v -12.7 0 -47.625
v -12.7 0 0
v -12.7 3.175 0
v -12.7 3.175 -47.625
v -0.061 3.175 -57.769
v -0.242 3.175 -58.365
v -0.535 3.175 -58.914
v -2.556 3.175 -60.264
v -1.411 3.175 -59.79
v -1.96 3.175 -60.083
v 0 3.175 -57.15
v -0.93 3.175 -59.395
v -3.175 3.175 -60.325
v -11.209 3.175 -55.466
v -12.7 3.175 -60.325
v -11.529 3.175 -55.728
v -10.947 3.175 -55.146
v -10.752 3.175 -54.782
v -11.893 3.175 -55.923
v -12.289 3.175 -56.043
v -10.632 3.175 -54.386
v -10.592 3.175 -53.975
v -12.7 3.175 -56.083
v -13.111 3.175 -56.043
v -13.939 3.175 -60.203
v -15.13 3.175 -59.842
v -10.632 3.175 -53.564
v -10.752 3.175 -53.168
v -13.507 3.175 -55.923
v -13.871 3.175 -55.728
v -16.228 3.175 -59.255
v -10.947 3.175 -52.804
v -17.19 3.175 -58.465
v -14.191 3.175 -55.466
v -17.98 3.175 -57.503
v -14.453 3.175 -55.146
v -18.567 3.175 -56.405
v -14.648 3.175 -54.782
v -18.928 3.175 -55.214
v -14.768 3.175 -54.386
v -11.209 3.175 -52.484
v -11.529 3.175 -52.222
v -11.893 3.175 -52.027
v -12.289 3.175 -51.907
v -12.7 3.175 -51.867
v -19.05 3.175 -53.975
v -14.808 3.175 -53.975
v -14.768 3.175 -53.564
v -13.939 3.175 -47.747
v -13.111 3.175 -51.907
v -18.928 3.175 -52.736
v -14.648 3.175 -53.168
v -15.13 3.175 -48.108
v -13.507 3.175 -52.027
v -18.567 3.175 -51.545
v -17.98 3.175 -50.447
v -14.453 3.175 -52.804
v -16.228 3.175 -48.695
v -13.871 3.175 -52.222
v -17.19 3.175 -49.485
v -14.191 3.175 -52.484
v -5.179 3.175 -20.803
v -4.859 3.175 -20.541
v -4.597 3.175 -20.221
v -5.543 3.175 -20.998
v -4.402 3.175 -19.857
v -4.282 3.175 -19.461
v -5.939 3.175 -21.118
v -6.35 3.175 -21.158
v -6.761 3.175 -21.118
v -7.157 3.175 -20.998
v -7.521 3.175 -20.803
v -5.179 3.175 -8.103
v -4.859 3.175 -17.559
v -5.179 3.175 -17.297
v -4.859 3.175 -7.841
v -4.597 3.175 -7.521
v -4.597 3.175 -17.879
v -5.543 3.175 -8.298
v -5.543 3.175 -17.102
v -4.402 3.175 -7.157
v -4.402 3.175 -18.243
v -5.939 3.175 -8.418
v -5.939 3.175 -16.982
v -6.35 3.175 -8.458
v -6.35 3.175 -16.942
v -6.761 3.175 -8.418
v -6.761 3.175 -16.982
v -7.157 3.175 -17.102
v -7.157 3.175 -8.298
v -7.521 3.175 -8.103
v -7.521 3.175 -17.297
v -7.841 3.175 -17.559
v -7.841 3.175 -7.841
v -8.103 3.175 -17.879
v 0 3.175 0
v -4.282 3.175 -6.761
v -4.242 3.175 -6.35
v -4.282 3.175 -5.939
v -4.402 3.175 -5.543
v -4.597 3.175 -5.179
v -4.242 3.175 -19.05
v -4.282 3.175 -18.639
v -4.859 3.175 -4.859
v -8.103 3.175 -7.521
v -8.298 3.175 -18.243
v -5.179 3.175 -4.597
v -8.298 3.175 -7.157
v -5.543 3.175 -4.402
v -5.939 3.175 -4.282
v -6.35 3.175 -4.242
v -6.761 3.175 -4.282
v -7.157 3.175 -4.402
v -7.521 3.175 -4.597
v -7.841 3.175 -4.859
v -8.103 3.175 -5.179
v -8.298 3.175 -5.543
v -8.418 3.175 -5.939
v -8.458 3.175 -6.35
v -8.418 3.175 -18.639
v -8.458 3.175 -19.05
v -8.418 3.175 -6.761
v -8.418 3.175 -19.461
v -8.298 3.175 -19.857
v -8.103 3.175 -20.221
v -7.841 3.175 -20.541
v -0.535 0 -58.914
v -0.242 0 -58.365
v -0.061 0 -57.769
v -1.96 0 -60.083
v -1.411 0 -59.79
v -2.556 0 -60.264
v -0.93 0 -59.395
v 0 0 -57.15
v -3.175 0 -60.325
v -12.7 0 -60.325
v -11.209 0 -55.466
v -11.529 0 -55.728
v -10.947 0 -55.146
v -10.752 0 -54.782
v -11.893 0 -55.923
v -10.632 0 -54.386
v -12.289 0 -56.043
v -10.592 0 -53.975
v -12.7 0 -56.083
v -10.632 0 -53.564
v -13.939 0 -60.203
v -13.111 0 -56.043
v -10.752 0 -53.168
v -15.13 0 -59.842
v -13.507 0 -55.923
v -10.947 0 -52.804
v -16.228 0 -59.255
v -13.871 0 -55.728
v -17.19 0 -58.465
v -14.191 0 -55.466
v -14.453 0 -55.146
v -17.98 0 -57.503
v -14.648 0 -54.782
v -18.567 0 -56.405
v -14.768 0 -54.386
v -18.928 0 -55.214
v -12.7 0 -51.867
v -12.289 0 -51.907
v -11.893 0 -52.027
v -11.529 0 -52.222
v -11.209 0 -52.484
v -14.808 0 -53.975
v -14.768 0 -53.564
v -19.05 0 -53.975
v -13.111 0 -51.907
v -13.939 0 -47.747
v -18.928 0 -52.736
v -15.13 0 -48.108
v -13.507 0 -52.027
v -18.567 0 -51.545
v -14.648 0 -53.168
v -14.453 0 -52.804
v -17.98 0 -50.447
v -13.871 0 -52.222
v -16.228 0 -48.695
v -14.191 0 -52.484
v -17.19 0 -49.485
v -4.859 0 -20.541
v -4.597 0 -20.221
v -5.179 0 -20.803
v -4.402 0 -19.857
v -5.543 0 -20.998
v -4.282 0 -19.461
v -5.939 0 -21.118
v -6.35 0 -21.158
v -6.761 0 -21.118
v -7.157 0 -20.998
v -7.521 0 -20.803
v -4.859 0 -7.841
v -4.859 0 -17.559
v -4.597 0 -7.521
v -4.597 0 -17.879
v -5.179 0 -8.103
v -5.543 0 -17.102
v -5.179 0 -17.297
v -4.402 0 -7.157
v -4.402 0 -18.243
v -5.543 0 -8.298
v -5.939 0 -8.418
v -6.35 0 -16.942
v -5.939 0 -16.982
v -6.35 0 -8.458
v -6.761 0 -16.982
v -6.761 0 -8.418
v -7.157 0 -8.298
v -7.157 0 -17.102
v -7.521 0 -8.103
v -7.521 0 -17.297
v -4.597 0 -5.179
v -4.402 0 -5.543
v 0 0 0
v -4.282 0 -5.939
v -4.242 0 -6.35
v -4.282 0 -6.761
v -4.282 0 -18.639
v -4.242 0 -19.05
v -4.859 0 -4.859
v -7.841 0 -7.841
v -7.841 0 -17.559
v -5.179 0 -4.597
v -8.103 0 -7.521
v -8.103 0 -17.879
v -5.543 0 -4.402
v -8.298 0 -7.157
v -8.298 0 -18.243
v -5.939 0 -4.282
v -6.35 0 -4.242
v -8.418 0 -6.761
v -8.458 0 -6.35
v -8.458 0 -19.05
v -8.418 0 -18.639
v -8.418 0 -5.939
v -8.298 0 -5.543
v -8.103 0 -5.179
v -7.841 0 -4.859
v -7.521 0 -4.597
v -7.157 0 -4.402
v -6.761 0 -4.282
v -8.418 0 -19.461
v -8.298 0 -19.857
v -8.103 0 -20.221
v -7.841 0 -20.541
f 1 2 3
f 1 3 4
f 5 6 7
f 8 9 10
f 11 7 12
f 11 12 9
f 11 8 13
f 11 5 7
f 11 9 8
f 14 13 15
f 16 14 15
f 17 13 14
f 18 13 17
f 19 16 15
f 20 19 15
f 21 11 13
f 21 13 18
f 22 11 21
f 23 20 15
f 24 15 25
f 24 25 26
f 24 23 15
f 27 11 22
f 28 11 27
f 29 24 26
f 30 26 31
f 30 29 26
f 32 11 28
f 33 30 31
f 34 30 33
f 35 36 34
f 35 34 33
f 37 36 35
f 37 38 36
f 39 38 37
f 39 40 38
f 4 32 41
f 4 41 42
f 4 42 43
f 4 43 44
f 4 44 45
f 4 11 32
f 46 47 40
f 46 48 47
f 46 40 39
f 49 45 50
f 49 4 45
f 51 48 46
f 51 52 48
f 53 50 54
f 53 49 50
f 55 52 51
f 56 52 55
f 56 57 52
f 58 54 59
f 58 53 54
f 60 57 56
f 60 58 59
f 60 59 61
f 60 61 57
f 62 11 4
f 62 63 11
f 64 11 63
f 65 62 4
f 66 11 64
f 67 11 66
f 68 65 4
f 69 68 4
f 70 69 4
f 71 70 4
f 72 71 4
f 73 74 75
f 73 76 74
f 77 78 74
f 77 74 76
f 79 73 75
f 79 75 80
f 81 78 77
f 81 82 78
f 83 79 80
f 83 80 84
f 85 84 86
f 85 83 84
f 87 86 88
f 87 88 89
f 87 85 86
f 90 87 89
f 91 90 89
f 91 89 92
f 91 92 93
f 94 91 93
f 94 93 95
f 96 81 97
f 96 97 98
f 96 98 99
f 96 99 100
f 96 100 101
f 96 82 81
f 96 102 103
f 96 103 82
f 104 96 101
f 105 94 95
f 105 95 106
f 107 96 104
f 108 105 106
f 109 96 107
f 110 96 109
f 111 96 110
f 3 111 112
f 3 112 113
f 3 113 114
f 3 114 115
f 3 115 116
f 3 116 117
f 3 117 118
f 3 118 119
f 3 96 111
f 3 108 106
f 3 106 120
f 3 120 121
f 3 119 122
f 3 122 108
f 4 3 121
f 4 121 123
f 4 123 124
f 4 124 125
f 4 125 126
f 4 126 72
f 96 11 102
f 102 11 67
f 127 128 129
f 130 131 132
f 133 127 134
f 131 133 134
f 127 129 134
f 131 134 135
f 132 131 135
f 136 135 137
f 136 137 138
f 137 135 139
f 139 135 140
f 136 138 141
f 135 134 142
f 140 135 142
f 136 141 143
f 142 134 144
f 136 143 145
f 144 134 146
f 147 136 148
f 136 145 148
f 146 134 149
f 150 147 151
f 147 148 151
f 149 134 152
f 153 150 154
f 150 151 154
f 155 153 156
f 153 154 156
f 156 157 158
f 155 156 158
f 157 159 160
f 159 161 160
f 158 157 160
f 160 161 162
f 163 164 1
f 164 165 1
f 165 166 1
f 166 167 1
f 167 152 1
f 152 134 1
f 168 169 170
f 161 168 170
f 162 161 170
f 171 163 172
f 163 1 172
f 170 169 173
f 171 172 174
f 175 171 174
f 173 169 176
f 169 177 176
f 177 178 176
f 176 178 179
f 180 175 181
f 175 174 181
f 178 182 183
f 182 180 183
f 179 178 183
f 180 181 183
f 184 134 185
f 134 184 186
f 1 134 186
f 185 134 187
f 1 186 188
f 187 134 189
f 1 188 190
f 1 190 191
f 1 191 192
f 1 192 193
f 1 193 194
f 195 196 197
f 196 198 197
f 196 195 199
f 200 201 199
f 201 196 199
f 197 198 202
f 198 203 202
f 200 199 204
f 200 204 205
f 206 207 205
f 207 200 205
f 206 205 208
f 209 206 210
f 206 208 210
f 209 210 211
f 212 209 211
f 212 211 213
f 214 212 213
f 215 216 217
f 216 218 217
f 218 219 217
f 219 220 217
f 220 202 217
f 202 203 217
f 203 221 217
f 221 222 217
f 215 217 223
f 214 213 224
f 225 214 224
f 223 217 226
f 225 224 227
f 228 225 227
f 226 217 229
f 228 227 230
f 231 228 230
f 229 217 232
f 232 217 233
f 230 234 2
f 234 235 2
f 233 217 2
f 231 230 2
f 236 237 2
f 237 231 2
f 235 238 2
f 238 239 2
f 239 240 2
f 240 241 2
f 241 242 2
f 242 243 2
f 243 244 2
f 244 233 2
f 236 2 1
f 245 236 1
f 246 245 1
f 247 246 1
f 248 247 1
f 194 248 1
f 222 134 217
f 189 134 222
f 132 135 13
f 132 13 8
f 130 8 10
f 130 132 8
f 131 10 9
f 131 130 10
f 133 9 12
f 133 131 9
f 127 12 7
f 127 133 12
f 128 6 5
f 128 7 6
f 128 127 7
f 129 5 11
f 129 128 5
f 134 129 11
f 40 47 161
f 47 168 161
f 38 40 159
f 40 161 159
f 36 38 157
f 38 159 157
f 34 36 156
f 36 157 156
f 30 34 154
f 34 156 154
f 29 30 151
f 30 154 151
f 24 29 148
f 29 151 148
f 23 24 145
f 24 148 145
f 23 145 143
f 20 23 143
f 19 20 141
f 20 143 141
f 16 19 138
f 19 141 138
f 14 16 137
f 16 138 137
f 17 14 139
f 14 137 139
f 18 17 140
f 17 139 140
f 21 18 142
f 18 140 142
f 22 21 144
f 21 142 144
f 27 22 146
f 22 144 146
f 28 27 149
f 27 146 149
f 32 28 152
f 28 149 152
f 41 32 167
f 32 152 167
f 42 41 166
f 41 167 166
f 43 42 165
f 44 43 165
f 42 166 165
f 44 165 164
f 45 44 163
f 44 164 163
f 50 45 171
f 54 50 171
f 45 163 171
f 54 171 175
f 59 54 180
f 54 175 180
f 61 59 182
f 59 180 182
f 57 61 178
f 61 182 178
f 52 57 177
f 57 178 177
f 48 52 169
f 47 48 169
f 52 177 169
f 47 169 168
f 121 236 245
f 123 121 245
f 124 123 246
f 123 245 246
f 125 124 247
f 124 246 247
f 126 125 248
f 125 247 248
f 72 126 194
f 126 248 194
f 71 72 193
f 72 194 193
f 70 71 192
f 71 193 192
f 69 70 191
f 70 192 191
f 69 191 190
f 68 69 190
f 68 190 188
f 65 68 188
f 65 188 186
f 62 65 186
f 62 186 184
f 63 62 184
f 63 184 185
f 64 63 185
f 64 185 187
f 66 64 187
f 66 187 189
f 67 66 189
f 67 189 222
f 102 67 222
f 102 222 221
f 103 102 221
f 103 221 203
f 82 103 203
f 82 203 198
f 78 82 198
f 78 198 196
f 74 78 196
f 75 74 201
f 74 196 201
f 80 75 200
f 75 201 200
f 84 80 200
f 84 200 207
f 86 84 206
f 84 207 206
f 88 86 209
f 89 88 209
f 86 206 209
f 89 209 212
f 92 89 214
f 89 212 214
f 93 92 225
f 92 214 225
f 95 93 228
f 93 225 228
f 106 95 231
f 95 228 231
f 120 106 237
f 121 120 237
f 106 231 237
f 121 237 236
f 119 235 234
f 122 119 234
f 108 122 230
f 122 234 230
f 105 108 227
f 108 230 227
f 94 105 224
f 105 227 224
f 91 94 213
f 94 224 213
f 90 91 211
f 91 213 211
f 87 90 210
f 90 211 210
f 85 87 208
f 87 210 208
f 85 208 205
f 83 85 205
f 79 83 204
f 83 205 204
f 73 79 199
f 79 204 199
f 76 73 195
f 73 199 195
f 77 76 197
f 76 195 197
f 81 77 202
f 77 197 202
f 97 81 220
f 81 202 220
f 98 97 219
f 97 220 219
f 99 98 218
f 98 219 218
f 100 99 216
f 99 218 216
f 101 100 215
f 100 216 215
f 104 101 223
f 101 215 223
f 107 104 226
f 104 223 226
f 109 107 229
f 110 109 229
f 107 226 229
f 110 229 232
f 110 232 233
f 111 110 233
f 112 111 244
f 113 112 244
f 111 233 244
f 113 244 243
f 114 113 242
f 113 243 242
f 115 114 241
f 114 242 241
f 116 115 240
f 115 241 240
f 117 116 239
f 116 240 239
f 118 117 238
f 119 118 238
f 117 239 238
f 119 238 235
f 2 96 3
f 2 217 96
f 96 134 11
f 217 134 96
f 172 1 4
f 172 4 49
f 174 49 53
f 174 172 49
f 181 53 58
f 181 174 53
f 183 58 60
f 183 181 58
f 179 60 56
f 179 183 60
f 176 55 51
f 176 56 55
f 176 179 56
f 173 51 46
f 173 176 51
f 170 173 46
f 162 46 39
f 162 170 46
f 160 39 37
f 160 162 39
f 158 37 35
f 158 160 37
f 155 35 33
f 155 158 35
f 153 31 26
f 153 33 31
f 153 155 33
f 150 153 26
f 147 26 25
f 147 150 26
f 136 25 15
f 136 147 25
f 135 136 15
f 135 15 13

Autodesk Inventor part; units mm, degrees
ref_plane "YZ Plane" through (0, 0, 0) normal (1, 0, 0) x (0, 1, 0)
ref_plane "XZ Plane" through (0, 0, 0) normal (0, 1, 0) x (-1, 0, 0)
ref_plane "XY Plane" through (0, 0, 0) normal (0, 0, 1) x (1, 0, 0)
sketch "Sketch1" plane through (0, 0, 0) normal (0, 1, 0) x (-1, 0, 0)
  line L0 (0, 0) -> (12.7, 0)
  line L1 (12.7, 0) -> (12.7, -47.625)
  line L2 (12.7, -47.625) -> (0, -47.625)
  line L3 (0, -47.625) -> (0, 0)
  line L4 (6.35, 0) -> (6.35, -6.35)
  circle A0 centre (6.35, -6.35) radius 2.1082
  line L5 (6.35, -6.35) -> (6.35, -19.05)
  circle A1 centre (6.35, -19.05) radius 2.1082
  line L6 (6.35, -19.05) -> (6.35, -53.975)
  line L7 (6.35, -53.975) -> (12.7, -53.975)
  circle A2 centre (12.7, -53.975) radius 2.1082
  line L8 (12.7, -53.975) -> (12.7, -60.325)
  arc A3 (12.7, -60.325) -> (12.7, -47.625) centre (12.7, -53.975) ccw
  line L9 (0, -47.625) -> (0, -53.975)
  line L10 (12.7, -60.325) -> (3.175, -60.325)
  line L11 (0, -57.15) -> (0, -53.975)
  arc A4 (0, -57.15) -> (3.175, -60.325) centre (3.175, -57.15) ccw
  dimension "d0" = 12.7
  dimension "d1" = 6.35
  dimension "d2" = 4.2164
  dimension "d3" = 47.625
  dimension "d4" = 12.7
  dimension "d5" = 34.925
  dimension "d6" = 6.35
  dimension "d7" = 4.2164
  dimension "d8" = 6.35
  dimension "d9" = 3.175
extrude "Extrusion1" add sketch "Sketch1" along normal blind 3.175 contours L0 L4 A0 L5 A1 L6 L2 L3 | L0 L1 L2 L6 A1 L5 A0 L4 | L2 L6 L7 A2 L8 L10 A4 L11 L9 | L2 A3 L8 A2 L7 L6
properties part number "wing mount no stopper" material "Aluminum 6061"
